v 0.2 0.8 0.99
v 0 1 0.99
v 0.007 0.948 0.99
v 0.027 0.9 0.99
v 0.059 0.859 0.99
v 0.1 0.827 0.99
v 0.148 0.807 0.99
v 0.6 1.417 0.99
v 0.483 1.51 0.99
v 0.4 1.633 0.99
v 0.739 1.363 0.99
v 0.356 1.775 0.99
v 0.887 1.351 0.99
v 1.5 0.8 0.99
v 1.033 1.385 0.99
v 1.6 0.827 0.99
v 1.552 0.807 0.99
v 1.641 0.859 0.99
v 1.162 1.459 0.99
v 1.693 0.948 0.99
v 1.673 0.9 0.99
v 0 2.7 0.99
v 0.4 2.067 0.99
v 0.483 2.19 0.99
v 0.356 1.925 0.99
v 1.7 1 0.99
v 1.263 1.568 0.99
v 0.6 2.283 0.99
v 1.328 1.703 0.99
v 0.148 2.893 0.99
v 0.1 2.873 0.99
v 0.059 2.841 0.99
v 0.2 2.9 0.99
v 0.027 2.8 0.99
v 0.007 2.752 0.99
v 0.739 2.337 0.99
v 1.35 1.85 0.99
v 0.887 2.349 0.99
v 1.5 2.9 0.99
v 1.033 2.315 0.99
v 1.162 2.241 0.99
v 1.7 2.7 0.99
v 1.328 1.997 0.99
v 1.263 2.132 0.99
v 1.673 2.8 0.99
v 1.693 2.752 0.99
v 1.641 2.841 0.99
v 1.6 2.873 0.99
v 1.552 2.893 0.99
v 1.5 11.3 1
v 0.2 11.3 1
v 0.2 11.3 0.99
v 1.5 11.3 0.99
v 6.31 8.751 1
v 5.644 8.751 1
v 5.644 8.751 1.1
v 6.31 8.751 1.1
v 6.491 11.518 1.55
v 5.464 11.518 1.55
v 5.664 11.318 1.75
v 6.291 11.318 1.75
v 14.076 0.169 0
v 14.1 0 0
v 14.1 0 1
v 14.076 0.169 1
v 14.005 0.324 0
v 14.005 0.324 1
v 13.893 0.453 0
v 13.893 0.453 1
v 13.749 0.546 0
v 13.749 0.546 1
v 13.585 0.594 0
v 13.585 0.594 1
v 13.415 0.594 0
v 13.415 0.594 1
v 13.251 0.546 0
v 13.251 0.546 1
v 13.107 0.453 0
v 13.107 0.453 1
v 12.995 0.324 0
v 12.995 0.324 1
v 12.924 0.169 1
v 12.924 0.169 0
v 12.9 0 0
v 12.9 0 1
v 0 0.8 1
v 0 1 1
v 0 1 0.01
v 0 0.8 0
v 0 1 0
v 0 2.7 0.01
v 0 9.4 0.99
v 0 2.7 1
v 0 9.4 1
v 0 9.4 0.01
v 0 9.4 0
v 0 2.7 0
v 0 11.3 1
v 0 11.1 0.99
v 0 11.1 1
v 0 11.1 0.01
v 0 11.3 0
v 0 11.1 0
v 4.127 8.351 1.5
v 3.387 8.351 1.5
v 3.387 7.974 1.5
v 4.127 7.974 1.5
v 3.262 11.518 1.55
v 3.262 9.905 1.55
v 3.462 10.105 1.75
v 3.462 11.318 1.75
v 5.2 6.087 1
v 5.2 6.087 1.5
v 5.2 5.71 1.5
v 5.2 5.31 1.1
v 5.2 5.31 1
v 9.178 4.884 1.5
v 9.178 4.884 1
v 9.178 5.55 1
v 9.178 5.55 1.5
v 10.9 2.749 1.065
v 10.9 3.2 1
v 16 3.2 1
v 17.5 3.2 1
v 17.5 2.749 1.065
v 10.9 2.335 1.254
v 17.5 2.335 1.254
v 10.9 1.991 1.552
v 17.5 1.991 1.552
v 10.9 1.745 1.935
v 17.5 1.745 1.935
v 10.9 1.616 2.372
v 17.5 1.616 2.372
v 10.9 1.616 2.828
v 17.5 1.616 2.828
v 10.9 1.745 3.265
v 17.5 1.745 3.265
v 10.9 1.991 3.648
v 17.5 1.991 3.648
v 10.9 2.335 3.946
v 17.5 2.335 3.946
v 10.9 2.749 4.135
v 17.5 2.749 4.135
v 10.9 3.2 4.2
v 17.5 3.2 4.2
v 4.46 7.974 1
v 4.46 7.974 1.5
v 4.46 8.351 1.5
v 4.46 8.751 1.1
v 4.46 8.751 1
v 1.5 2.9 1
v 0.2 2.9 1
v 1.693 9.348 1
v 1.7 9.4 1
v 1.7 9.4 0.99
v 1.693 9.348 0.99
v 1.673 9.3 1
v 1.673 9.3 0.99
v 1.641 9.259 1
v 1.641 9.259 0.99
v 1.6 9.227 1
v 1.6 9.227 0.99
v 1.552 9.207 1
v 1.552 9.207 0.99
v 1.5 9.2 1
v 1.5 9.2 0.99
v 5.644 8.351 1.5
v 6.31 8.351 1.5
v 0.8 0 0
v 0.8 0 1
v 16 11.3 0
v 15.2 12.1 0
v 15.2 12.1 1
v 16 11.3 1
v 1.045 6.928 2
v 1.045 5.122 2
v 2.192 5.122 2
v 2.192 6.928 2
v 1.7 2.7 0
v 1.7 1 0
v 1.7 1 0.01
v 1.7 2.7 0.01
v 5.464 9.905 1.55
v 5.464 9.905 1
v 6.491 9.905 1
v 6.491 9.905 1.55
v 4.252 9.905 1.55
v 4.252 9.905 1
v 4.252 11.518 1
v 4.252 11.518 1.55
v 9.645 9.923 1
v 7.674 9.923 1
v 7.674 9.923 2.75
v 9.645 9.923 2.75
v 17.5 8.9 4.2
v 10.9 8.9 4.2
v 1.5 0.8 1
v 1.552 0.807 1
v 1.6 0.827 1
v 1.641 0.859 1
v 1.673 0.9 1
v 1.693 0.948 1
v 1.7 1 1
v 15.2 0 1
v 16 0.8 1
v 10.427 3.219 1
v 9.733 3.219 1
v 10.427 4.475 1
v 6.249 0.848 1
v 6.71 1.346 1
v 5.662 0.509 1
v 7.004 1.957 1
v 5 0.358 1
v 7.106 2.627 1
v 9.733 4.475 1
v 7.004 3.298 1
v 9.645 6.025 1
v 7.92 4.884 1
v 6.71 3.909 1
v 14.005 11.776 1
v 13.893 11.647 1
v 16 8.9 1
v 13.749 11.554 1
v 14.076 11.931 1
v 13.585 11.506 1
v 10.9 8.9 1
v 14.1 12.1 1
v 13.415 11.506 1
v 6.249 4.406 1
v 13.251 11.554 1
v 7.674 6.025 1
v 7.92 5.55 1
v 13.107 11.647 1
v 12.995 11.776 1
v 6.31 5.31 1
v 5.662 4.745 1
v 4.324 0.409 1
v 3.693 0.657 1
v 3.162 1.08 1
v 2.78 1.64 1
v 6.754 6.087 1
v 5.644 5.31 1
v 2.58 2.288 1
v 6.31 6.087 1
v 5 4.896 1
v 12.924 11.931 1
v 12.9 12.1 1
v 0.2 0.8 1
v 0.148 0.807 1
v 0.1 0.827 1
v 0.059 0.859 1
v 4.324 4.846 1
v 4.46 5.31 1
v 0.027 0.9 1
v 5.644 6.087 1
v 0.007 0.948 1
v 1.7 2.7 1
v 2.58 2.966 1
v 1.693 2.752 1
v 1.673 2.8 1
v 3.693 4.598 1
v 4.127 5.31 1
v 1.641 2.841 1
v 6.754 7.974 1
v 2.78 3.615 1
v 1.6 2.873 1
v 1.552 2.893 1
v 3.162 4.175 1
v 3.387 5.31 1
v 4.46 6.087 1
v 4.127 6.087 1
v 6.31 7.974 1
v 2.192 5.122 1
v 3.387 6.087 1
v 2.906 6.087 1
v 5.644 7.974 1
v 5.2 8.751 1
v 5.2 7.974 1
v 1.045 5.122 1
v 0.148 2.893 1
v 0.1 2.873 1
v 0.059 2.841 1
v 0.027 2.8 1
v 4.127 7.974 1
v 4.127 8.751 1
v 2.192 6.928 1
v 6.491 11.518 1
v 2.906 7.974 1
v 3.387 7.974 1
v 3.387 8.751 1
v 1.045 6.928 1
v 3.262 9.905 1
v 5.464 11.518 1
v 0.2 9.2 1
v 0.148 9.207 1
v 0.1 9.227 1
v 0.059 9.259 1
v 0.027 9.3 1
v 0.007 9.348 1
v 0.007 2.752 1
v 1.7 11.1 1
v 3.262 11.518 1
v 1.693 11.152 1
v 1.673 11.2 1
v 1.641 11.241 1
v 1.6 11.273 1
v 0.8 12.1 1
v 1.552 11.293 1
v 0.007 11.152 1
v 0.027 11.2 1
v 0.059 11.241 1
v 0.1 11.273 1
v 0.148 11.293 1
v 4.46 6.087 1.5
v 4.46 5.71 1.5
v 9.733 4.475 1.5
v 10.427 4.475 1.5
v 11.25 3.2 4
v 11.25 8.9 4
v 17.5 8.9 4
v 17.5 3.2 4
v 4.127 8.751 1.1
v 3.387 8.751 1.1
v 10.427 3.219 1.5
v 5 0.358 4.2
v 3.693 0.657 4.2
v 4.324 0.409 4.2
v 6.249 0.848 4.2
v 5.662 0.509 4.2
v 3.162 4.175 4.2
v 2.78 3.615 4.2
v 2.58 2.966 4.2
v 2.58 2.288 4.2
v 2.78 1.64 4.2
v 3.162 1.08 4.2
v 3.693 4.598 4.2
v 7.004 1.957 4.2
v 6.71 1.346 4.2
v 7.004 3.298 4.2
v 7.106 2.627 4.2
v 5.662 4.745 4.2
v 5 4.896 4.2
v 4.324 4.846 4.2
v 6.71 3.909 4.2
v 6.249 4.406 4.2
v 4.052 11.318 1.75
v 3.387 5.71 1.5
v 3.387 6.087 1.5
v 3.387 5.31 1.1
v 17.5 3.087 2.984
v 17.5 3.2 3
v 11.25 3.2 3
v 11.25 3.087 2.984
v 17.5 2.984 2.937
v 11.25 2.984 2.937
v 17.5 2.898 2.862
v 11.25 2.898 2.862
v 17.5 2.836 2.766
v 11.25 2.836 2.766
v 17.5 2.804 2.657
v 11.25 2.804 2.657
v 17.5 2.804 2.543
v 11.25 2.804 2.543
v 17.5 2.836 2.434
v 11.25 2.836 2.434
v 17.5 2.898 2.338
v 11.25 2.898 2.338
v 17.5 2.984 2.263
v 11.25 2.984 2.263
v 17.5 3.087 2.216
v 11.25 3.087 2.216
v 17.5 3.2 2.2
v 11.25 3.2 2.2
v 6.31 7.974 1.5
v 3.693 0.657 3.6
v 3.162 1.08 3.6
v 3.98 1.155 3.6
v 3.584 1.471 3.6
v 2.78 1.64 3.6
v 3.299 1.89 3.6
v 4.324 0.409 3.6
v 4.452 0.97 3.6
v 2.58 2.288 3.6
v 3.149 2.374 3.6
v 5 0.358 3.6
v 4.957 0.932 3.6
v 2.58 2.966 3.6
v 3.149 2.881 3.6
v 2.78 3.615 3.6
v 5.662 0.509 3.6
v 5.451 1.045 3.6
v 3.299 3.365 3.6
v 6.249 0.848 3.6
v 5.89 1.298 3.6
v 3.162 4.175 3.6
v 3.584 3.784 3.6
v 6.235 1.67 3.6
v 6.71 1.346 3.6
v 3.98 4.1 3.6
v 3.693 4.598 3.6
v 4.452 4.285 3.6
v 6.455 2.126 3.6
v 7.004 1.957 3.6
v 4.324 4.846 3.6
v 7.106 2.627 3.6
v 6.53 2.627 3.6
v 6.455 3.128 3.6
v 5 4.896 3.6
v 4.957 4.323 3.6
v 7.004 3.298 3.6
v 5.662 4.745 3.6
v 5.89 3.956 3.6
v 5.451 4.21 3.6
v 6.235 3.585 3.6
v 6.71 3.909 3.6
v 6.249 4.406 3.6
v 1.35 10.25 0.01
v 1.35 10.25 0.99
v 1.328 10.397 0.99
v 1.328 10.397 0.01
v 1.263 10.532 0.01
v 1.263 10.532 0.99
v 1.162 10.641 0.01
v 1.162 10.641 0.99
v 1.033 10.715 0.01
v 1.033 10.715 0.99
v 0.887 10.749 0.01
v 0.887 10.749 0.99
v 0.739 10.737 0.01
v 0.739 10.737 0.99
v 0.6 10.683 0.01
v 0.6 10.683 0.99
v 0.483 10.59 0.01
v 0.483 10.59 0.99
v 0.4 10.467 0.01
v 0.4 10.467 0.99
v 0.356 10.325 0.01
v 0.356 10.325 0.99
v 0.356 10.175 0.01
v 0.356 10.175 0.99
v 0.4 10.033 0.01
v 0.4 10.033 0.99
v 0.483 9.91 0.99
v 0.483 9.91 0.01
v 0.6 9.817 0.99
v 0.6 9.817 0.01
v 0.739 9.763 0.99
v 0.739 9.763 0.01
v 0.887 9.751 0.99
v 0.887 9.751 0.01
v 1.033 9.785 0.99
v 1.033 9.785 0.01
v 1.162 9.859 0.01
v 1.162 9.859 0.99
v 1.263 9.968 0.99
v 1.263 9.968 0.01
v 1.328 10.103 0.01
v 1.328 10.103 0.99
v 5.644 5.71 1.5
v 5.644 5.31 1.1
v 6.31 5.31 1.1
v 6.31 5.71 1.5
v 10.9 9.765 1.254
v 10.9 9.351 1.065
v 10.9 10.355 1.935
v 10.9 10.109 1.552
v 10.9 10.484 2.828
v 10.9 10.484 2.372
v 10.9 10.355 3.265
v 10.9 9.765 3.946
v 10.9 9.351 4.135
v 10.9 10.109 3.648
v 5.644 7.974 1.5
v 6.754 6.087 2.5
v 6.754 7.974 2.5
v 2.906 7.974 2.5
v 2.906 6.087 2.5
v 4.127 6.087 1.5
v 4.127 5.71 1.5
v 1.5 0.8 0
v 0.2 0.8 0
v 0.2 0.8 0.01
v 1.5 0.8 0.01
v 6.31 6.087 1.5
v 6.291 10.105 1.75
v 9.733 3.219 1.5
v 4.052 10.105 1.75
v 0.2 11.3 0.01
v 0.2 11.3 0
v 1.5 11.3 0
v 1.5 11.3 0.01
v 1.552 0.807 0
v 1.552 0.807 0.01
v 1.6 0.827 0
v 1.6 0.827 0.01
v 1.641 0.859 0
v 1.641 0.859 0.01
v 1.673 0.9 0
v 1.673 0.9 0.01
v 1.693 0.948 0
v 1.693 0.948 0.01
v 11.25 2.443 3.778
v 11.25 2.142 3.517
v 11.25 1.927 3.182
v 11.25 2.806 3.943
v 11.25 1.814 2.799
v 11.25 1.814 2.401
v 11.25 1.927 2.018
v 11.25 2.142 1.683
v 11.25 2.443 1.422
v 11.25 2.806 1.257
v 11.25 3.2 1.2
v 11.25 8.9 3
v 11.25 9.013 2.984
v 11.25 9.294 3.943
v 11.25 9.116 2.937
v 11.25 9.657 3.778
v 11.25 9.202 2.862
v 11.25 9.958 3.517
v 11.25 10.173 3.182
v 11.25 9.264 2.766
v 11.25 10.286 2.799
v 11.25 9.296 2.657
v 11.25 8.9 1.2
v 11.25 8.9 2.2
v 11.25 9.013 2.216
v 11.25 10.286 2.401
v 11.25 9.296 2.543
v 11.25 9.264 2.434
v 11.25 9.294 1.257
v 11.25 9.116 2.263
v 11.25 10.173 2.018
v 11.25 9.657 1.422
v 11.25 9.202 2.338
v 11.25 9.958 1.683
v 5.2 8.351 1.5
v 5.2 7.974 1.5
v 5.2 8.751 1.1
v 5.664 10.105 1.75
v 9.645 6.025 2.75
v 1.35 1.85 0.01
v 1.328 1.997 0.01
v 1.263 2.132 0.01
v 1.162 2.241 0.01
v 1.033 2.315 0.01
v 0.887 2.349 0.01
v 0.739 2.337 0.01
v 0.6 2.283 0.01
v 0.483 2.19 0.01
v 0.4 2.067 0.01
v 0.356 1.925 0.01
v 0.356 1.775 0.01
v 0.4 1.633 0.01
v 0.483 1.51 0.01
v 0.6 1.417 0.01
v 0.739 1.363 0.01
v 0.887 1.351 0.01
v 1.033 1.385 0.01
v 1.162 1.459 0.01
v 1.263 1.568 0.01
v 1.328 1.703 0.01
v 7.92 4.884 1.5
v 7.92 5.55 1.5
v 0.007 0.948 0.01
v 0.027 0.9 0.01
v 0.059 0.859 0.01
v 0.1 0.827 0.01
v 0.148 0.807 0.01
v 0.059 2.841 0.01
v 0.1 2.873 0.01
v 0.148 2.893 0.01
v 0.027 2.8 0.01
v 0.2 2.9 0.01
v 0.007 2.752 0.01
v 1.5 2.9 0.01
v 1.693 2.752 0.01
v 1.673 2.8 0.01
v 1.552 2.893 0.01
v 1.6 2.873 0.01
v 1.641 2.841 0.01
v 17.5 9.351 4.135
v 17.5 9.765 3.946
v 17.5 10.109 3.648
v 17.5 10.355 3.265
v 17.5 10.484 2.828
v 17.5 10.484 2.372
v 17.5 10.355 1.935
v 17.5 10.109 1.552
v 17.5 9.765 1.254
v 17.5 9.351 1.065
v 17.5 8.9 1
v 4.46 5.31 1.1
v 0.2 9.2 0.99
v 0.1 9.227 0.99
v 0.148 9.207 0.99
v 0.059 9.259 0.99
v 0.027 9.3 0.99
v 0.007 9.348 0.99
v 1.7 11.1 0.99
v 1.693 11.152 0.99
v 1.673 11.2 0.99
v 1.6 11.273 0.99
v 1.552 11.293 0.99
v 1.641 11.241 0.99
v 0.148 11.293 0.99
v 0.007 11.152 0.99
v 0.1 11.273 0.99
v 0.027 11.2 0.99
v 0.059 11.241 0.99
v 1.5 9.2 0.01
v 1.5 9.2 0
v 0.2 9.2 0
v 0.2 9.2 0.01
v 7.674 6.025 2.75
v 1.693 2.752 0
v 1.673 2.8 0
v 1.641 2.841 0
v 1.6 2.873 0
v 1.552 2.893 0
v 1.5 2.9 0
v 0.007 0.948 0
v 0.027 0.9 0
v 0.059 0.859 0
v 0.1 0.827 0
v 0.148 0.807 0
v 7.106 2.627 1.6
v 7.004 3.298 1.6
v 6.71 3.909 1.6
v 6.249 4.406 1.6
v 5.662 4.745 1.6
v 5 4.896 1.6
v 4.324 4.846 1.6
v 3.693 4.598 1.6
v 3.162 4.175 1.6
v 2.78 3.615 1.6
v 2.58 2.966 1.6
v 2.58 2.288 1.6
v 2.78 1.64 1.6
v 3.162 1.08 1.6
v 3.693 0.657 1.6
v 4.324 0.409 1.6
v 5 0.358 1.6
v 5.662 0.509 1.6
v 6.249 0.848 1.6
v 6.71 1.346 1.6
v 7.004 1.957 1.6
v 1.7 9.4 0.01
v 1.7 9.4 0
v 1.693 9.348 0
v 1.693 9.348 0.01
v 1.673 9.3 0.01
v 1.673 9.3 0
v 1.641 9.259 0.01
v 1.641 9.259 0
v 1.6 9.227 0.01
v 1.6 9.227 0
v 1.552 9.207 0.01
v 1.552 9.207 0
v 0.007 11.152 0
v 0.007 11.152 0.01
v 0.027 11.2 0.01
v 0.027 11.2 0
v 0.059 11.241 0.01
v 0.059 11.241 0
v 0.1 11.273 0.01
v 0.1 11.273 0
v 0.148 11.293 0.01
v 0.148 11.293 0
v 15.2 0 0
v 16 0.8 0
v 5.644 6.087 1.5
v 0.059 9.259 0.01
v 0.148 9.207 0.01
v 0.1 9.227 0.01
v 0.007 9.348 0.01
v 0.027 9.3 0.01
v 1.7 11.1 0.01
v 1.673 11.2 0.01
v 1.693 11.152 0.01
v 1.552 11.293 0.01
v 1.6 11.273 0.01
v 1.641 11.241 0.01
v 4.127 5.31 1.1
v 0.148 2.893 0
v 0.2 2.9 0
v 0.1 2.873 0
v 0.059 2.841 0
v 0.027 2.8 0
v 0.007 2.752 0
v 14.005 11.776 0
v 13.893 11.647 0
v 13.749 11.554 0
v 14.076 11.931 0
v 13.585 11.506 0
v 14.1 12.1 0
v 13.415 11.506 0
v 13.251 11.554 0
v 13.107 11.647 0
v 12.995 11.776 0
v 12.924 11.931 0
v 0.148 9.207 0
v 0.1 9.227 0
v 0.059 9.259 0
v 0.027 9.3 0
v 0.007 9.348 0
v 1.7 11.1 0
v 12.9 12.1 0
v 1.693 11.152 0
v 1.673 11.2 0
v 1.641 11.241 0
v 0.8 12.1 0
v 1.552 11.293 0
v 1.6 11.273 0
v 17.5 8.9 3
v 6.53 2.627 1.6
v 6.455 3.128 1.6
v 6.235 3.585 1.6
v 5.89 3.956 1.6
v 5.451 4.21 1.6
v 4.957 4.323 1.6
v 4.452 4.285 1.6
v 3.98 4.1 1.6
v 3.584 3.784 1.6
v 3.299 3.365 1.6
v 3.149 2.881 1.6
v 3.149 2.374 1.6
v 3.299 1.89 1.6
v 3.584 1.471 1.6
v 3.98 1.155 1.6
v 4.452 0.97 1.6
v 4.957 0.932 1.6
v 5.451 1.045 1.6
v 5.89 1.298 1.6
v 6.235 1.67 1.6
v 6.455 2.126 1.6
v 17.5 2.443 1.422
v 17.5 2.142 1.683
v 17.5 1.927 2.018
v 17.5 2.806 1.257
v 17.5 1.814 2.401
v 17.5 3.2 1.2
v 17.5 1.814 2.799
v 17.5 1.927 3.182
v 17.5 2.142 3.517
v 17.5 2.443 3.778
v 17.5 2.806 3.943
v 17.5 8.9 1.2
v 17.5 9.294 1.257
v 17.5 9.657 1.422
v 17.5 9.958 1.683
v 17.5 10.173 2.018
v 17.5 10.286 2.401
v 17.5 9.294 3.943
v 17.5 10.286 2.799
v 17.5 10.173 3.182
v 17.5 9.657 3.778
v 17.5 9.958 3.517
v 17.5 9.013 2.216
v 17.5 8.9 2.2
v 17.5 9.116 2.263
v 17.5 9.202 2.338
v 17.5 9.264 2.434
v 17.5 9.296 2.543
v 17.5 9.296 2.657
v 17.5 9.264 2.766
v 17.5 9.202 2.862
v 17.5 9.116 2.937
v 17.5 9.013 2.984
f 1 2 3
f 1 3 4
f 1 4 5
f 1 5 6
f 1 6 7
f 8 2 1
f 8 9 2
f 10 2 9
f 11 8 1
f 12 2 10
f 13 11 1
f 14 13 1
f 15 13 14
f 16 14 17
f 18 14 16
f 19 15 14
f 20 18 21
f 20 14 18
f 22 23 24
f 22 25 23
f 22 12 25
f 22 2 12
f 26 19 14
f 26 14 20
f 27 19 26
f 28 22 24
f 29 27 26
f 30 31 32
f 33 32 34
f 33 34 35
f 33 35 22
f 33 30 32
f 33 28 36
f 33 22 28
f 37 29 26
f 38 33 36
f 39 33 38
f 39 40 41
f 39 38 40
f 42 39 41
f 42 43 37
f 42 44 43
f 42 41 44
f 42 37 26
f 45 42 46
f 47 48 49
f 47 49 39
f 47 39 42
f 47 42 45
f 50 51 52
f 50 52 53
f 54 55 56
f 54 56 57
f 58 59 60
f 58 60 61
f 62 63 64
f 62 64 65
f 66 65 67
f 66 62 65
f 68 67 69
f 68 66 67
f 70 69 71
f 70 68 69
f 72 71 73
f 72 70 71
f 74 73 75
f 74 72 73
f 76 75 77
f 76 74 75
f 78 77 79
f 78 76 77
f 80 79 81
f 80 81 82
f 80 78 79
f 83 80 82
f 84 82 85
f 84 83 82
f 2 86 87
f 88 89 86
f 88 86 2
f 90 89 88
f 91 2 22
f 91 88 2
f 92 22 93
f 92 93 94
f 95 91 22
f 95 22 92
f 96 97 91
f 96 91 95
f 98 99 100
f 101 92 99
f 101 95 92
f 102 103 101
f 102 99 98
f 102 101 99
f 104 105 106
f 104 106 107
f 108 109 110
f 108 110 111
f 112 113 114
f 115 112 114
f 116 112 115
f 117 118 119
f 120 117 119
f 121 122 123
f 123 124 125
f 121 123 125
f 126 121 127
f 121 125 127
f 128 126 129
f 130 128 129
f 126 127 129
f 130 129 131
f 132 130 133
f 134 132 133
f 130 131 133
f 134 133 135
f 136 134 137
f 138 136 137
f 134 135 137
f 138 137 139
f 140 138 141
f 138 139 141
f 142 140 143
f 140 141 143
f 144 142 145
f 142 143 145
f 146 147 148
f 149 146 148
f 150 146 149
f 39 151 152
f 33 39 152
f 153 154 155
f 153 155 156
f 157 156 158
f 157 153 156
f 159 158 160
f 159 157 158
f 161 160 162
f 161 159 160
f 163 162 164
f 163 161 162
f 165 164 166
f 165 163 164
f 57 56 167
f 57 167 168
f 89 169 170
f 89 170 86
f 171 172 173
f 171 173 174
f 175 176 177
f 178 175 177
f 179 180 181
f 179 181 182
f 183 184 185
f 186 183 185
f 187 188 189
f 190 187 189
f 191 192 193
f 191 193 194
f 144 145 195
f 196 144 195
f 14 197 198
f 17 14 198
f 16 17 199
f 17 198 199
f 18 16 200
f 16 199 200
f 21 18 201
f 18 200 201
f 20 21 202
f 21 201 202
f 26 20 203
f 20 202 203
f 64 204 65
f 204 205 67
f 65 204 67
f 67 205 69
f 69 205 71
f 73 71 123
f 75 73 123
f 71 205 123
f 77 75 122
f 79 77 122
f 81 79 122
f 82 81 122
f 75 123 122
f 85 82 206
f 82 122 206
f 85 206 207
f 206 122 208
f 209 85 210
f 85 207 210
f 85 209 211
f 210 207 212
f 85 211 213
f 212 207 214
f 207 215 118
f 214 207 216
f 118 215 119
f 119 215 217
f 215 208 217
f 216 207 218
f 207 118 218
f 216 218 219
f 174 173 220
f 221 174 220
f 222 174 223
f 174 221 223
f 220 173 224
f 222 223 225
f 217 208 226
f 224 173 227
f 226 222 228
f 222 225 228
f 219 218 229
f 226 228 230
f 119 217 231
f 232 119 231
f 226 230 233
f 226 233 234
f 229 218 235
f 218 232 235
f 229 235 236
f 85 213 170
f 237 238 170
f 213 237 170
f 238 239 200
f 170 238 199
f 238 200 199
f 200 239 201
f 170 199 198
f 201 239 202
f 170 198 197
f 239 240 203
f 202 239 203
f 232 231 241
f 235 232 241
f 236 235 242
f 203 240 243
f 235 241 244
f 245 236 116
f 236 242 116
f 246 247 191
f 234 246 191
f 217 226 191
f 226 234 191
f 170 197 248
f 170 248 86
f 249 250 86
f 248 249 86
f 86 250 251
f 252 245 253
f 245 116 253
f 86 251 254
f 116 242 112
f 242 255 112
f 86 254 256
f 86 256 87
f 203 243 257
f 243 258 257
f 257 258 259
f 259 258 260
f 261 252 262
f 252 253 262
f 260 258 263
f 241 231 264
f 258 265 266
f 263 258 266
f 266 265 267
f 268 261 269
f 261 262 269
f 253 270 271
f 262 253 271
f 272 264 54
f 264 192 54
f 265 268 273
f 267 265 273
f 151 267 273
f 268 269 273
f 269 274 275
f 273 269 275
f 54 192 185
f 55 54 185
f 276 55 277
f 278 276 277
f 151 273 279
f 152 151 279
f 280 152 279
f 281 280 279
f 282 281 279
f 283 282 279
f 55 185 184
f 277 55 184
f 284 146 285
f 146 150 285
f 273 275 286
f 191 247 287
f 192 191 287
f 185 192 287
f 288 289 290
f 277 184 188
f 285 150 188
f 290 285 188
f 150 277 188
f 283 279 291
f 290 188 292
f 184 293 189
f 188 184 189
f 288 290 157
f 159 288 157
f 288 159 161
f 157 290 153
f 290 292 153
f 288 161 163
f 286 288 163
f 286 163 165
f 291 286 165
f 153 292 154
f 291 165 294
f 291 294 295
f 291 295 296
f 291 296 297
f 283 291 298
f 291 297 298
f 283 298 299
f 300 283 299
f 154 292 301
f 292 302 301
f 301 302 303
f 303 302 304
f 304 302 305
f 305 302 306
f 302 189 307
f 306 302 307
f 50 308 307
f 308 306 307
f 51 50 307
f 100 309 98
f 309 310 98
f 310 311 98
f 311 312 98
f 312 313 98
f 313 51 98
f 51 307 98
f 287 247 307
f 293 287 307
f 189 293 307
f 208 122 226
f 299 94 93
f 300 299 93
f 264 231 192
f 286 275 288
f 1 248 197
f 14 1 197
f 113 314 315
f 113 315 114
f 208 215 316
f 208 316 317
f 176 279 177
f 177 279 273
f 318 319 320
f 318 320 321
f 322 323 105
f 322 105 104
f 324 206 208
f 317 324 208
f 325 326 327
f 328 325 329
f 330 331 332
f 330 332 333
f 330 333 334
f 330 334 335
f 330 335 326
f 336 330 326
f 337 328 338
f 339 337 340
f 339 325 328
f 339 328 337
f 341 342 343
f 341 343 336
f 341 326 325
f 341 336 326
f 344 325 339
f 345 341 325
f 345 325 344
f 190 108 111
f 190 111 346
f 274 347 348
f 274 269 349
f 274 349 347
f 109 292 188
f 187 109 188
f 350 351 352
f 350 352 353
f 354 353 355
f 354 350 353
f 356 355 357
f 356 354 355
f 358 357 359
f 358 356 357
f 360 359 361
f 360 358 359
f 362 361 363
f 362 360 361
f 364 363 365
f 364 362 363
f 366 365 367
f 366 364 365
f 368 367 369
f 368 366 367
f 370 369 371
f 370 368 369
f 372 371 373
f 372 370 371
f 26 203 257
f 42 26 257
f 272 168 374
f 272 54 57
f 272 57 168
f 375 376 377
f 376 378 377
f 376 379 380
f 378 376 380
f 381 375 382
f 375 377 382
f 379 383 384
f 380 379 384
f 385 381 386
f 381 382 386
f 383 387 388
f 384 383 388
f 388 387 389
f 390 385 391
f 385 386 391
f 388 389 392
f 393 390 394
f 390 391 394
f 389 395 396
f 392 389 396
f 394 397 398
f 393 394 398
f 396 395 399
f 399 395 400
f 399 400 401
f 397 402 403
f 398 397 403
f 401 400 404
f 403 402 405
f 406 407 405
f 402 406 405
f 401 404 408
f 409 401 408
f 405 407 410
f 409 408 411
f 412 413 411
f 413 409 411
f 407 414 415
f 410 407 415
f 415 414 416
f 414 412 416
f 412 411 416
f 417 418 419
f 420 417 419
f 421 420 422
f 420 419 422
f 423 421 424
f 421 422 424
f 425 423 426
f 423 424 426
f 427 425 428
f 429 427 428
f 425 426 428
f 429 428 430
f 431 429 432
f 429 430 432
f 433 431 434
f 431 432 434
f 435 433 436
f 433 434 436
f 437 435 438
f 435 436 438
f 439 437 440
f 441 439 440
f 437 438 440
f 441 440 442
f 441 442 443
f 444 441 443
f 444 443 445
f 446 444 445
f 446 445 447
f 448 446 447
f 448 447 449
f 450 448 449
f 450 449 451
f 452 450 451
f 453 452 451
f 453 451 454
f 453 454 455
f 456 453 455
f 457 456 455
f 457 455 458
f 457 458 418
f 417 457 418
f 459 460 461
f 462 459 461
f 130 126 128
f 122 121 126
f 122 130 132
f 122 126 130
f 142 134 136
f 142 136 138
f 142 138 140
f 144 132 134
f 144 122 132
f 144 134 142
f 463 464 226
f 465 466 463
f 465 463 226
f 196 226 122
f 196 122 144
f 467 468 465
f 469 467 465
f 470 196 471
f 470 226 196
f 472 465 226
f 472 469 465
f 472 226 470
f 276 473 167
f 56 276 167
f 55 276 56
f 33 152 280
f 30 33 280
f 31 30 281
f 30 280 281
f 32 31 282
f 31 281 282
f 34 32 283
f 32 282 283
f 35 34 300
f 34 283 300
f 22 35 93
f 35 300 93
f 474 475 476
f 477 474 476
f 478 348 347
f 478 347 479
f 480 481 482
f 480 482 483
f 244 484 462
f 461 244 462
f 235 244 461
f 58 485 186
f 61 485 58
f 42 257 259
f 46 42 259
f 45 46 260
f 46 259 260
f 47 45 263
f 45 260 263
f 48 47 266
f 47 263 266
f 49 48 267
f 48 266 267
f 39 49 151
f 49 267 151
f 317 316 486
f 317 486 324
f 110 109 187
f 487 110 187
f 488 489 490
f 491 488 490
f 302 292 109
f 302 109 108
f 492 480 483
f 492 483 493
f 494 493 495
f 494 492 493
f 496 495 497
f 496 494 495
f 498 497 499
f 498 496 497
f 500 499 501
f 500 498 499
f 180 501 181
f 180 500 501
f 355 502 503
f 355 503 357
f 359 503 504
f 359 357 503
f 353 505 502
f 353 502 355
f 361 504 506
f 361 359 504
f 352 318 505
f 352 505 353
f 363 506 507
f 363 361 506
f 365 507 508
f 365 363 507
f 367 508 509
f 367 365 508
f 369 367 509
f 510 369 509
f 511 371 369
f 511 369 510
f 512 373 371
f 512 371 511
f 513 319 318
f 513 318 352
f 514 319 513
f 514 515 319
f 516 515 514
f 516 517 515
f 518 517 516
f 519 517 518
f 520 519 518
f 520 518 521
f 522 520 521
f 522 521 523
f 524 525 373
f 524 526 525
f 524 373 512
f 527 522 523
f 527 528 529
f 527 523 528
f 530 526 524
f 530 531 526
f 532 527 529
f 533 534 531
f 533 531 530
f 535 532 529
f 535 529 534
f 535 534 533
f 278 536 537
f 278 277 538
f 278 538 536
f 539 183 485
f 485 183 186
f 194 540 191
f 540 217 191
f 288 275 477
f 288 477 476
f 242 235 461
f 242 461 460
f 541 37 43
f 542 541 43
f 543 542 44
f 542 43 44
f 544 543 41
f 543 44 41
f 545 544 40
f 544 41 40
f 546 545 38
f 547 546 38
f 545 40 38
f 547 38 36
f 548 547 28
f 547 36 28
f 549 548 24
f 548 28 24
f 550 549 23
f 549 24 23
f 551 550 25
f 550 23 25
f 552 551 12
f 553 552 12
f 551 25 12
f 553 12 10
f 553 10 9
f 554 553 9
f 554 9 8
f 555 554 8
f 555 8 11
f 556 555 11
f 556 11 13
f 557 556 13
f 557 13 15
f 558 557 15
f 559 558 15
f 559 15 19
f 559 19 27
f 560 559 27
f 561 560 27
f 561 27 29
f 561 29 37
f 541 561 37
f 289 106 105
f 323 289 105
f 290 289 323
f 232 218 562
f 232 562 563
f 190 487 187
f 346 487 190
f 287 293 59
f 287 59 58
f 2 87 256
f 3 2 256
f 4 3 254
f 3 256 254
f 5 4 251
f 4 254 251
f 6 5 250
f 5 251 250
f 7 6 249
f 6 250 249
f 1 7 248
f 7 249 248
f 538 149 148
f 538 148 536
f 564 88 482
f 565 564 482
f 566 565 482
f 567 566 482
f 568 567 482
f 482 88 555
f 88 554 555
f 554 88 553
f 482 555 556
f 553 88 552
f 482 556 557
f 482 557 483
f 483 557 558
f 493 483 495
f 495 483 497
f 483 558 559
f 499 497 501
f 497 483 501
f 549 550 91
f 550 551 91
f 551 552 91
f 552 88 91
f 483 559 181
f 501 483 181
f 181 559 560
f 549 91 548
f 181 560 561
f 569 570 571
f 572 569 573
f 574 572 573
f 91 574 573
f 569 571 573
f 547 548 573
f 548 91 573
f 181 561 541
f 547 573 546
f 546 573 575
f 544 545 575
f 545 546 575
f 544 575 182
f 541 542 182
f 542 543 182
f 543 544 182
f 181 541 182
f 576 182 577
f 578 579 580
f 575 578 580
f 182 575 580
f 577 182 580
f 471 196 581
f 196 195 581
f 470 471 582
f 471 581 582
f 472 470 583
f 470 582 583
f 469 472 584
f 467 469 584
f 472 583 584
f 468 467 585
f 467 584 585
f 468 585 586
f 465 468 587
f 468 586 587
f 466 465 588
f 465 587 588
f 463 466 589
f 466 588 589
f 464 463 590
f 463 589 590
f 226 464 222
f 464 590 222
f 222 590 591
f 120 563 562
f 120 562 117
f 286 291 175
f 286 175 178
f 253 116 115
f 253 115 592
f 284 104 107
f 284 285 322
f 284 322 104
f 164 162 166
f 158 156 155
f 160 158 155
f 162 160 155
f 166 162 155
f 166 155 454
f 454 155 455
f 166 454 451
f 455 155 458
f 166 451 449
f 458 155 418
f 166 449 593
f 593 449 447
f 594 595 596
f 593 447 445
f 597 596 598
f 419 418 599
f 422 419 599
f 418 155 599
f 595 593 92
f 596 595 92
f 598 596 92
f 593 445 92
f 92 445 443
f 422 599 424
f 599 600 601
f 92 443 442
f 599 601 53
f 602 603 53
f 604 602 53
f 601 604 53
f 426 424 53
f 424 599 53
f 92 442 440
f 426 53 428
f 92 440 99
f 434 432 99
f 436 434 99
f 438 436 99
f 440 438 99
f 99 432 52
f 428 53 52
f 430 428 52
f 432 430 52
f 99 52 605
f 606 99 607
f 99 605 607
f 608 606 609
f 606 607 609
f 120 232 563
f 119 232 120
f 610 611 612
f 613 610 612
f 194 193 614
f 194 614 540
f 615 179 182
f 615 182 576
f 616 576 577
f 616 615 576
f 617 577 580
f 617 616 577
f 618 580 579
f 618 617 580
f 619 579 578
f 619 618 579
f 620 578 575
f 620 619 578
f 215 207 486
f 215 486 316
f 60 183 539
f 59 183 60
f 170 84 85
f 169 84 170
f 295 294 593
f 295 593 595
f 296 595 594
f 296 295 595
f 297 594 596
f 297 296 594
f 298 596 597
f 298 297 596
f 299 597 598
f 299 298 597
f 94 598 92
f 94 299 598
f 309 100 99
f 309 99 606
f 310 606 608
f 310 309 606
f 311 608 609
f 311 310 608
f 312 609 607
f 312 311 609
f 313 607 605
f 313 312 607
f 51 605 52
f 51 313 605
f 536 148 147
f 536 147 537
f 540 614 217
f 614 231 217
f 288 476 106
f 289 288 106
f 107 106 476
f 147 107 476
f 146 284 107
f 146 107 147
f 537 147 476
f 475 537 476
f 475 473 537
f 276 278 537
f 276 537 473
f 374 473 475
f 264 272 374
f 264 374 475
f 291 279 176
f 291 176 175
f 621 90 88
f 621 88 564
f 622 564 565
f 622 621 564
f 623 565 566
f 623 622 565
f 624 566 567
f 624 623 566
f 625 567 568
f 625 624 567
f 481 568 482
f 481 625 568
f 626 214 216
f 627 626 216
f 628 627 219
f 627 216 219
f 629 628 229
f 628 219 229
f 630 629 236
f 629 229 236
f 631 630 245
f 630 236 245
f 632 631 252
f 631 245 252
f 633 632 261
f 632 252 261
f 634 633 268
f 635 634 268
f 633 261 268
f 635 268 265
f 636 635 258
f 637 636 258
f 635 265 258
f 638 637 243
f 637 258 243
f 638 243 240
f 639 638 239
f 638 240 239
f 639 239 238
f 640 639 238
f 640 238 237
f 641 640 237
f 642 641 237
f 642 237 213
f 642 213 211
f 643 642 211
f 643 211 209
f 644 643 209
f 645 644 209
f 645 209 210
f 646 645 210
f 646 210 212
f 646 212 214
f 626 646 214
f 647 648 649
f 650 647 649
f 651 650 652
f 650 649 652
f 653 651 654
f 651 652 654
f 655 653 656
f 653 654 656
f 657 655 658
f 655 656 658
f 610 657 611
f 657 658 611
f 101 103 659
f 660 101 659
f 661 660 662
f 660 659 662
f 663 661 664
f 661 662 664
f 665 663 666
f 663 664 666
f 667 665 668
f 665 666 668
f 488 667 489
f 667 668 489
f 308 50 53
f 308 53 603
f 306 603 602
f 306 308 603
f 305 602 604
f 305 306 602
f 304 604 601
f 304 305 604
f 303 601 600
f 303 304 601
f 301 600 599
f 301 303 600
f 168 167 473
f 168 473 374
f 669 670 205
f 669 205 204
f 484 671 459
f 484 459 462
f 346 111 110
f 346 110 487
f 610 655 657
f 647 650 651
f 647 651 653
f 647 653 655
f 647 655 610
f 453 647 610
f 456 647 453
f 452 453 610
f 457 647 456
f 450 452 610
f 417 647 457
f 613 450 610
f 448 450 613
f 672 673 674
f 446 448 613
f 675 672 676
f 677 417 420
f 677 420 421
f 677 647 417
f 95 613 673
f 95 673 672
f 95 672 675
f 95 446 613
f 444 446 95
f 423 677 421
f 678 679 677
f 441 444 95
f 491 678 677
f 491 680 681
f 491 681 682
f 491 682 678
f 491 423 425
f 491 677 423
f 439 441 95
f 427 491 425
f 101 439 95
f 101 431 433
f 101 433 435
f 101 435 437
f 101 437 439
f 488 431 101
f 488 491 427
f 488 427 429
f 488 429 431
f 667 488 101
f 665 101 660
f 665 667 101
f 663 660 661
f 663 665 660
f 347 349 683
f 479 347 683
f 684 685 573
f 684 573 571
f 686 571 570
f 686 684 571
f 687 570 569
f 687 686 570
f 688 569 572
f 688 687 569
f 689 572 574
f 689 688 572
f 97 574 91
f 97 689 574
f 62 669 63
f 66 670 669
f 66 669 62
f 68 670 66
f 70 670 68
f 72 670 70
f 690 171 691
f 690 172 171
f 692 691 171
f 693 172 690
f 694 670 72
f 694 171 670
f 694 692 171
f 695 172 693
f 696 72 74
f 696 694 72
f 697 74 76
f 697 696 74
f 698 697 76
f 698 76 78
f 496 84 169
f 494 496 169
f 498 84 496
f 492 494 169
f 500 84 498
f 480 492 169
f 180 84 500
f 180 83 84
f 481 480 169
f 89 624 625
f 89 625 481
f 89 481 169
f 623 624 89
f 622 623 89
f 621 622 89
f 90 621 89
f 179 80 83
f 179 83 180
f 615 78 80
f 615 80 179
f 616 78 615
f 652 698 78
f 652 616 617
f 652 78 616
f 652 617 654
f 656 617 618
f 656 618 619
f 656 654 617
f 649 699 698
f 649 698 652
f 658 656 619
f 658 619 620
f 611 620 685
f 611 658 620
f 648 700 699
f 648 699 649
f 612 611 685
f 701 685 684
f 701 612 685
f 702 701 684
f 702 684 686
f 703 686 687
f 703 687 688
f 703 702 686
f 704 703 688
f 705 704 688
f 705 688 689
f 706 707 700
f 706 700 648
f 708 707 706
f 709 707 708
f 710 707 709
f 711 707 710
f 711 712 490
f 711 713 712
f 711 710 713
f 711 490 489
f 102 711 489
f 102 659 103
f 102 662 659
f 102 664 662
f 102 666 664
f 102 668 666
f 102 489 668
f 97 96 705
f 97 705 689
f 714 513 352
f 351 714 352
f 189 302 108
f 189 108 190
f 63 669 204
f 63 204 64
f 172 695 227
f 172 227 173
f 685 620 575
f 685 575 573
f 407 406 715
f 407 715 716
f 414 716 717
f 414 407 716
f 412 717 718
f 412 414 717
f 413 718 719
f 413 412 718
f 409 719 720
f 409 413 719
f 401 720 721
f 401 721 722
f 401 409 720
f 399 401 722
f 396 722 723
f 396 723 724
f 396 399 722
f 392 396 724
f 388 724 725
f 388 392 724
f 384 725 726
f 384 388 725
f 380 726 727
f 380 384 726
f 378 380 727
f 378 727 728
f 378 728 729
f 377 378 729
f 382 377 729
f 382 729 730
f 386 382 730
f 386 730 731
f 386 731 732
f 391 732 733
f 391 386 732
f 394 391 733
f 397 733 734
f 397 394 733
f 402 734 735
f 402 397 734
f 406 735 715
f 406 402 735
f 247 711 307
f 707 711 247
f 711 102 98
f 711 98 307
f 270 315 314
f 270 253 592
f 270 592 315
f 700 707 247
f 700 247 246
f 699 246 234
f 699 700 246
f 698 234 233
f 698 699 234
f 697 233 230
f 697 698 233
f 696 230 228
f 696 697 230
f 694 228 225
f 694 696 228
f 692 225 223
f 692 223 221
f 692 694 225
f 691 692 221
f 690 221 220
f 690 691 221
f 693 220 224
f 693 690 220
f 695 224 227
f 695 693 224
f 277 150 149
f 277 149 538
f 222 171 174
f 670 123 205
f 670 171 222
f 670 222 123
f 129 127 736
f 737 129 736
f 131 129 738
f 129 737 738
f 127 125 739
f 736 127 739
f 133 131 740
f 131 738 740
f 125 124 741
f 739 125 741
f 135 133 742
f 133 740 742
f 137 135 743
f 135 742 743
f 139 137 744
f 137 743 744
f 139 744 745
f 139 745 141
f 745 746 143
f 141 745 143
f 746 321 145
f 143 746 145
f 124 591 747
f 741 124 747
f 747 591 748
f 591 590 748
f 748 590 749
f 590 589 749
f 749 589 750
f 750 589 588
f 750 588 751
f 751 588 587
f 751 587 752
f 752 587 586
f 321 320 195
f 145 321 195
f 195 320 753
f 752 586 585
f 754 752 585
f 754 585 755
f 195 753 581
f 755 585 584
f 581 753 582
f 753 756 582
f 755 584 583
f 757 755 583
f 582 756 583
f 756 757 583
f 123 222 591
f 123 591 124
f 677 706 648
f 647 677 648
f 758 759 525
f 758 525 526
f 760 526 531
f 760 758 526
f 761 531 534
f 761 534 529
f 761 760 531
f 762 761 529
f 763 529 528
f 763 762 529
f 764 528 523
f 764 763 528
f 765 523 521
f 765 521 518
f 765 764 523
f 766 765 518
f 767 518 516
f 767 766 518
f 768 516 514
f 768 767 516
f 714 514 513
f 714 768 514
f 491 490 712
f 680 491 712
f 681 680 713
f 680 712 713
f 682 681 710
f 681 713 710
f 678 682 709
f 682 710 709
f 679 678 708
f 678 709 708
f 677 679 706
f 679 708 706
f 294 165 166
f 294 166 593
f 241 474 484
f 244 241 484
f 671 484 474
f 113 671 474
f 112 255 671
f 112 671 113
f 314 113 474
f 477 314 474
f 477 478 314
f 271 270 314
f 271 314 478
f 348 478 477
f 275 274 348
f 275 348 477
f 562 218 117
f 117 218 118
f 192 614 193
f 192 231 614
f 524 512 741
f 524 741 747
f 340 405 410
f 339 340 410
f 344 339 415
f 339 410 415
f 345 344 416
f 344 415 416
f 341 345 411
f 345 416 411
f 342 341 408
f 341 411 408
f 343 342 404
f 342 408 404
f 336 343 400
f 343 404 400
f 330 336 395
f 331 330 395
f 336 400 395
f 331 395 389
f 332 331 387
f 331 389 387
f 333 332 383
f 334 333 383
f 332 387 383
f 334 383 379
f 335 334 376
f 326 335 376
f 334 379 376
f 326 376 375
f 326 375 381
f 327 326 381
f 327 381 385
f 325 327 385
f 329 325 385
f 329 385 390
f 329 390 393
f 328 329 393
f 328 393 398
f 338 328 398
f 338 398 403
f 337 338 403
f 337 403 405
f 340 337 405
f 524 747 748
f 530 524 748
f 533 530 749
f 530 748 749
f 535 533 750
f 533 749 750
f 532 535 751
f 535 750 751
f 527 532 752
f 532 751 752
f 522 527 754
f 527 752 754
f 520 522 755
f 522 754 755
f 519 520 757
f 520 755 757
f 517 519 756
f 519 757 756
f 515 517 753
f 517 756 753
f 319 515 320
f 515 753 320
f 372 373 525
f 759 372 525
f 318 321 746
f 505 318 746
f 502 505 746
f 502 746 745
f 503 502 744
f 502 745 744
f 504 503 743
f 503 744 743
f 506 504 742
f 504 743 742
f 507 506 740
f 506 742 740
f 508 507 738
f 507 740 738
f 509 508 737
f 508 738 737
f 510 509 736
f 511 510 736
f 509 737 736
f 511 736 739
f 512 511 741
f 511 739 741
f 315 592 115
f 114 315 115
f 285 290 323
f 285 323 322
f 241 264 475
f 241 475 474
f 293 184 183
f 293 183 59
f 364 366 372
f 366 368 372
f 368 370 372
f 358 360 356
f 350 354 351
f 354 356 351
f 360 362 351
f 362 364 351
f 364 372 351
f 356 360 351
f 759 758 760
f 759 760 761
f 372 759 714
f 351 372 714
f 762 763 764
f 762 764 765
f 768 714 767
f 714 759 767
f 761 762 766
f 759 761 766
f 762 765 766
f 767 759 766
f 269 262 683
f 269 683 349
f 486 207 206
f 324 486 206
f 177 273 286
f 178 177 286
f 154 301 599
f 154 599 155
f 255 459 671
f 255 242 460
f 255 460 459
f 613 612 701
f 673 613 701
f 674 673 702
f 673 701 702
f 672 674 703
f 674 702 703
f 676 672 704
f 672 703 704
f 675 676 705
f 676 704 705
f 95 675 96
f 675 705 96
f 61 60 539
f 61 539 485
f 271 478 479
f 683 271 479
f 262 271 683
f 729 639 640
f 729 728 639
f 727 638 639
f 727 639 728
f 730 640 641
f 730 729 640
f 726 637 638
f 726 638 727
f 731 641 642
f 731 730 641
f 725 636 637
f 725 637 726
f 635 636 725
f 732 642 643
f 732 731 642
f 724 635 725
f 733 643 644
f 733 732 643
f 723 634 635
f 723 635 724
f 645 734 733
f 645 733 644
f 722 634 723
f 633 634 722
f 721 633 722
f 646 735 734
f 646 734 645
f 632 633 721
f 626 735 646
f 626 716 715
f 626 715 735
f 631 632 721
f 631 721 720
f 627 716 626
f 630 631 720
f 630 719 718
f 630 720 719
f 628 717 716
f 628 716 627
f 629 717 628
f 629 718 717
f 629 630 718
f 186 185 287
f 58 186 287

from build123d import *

# Parameters (mm, degrees)
BOSS_EXTRU_1_DEPTH      = 1
ESQUISSE2_R             = 0.5
ENL_V_MAT_EXTRU_1_DEPTH = 10
ENL_V_MAT_EXTRU_2_DEPTH = 0.01
ENL_V_START             = -1
ENL_V_MAT_EXTRU_3_DEPTH = 0.01
BOSS_EXTRU_2_DEPTH      = 1.5
BOSS_EXTRU_2_DEPTH_BACK = 5.1
ESQUISSE5_R             = 2.275332805
BOSS_EXTRU_3_DEPTH      = 3.2
ENL_V_START_2           = -0.6
ESQUISSE6_R             = 2.275332805
ESQUISSE6_R_2           = 1.7
ENL_V_MAT_EXTRU_4_DEPTH = 2
ESQUISSE7_W             = 1.97090018
ESQUISSE7_H             = 3.898474417
ESQUISSE7_W_2           = 0.989857895
ESQUISSE7_H_2           = 1.612554693
ESQUISSE7_W_3           = 1.027355852
ESQUISSE7_W_4           = 1.146705559
ESQUISSE7_H_3           = 1.806710228
BOSS_EXTRU_4_DEPTH      = 1.5
ESQUISSE8_W             = 1.25807389
ESQUISSE8_H             = 0.666039119
ESQUISSE8_W_2           = 0.69364074
ESQUISSE8_H_2           = 1.255273727
BOSS_EXTRU_5_DEPTH      = 0.5
ESQUISSE9_W             = 3.84822602
ESQUISSE9_H             = 0.777045638
ENL_V_MAT_EXTRU_5_DEPTH = 1
CHANFREIN1_SIZE         = 0.4
ESQUISSE10_W            = 3.228737269
ESQUISSE10_H            = 1.612554693
ENL_V_MAT_EXTRU_6_DEPTH = 0.75
ESQUISSE11_W            = 1.213675147
ESQUISSE11_H            = 1.927537991
ENL_V_MAT_EXTRU_7_DEPTH = 0.5
ESQUISSE12_W            = 1.97090018
ESQUISSE12_H            = 3.898474417
BOSS_EXTRU_6_DEPTH      = 0.25
CHANFREIN2_SIZE         = 0.2
ENL_V_MAT_EXTRU_8_DEPTH = 6.25


with BuildPart() as part:
    # Esquisse1 → Boss.-Extru.1 (new body)
    with BuildSketch(Plane.XY):
        with BuildLine():
            Line((0, 11.3), (0.8, 12.1))
            Line((0.8, 12.1), (12.9, 12.1))
            ThreePointArc((12.9, 12.1), (13.5, 11.5), (14.1, 12.1))
            Line((14.1, 12.1), (15.2, 12.1))
            Line((15.2, 12.1), (16, 11.3))
            Line((16, 11.3), (16, 0.8))
            Line((16, 0.8), (15.2, 0))
            Line((15.2, 0), (14.1, 0))
            ThreePointArc((14.1, 0), (13.5, 0.6), (12.9, 0))
            Line((12.9, 0), (0.8, 0))
            Line((0.8, 0), (0, 0.8))
            Line((0, 0.8), (0, 11.3))
        make_face()
    extrude(amount=BOSS_EXTRU_1_DEPTH)

    # Esquisse2 → Enl_v. mat.-Extru.1 (cut)
    with BuildSketch(Plane.XY.offset(1)):
        with Locations((0.85, 10.25)):
            Circle(ESQUISSE2_R)
        with Locations((0.85, 1.85)):
            Circle(ESQUISSE2_R)
    extrude(amount=-ENL_V_MAT_EXTRU_1_DEPTH, mode=Mode.SUBTRACT)

    # Esquisse3 → Enl_v. mat.-Extru.2 (cut)
    with BuildSketch(Plane.XY.offset(1)):
        with BuildLine():
            Line((1.5, 9.2), (0.2, 9.2))
            ThreePointArc((0.2, 9.2), (0.058578644, 9.258578644), (0, 9.4))
            Line((0, 9.4), (0, 11.1))
            ThreePointArc((0, 11.1), (0.058578644, 11.241421356), (0.2, 11.3))
            Line((0.2, 11.3), (1.5, 11.3))
            ThreePointArc((1.5, 11.3), (1.641421356, 11.241421356), (1.7, 11.1))
            Line((1.7, 11.1), (1.7, 9.4))
            ThreePointArc((1.7, 9.4), (1.641421356, 9.258578644), (1.5, 9.2))
        make_face()
        with BuildLine():
            Line((1.5, 2.9), (0.2, 2.9))
            ThreePointArc((0.2, 2.9), (0.058578644, 2.841421356), (0, 2.7))
            Line((0, 2.7), (0, 1))
            ThreePointArc((0, 1), (0.058578644, 0.858578644), (0.2, 0.8))
            Line((0.2, 0.8), (1.5, 0.8))
            ThreePointArc((1.5, 0.8), (1.641421356, 0.858578644), (1.7, 1))
            Line((1.7, 1), (1.7, 2.7))
            ThreePointArc((1.7, 2.7), (1.641421356, 2.841421356), (1.5, 2.9))
        make_face()
    extrude(amount=-ENL_V_MAT_EXTRU_2_DEPTH, mode=Mode.SUBTRACT)

    # Esquisse3_2 → Enl_v. mat.-Extru.3 (cut)
    with BuildSketch(Plane.XY.offset(1).offset(ENL_V_START)):
        with BuildLine():
            Line((1.5, 9.2), (0.2, 9.2))
            ThreePointArc((0.2, 9.2), (0.058578644, 9.258578644), (0, 9.4))
            Line((0, 9.4), (0, 11.1))
            ThreePointArc((0, 11.1), (0.058578644, 11.241421356), (0.2, 11.3))
            Line((0.2, 11.3), (1.5, 11.3))
            ThreePointArc((1.5, 11.3), (1.641421356, 11.241421356), (1.7, 11.1))
            Line((1.7, 11.1), (1.7, 9.4))
            ThreePointArc((1.7, 9.4), (1.641421356, 9.258578644), (1.5, 9.2))
        make_face()
        with BuildLine():
            Line((1.5, 2.9), (0.2, 2.9))
            ThreePointArc((0.2, 2.9), (0.058578644, 2.841421356), (0, 2.7))
            Line((0, 2.7), (0, 1))
            ThreePointArc((0, 1), (0.058578644, 0.858578644), (0.2, 0.8))
            Line((0.2, 0.8), (1.5, 0.8))
            ThreePointArc((1.5, 0.8), (1.641421356, 0.858578644), (1.7, 1))
            Line((1.7, 1), (1.7, 2.7))
            ThreePointArc((1.7, 2.7), (1.641421356, 2.841421356), (1.5, 2.9))
        make_face()
    extrude(amount=ENL_V_MAT_EXTRU_3_DEPTH, mode=Mode.SUBTRACT)

    # Esquisse4 → Boss.-Extru.2 (add, two sides)
    with BuildSketch(Plane(origin=(16, 0, 0), x_dir=(0, 0, -1), z_dir=(1, 0, 0))) as boss_extru_2_sk:
        with BuildLine():
            Line((-4.2, 3.2), (-4.2, 8.9))
            ThreePointArc((-4.2, 8.9), (-2.6, 10.5), (-1, 8.9))
            Line((-1, 8.9), (-1, 3.2))
            ThreePointArc((-1, 3.2), (-2.6, 1.6), (-4.2, 3.2))
        make_face()
    extrude(amount=BOSS_EXTRU_2_DEPTH)
    extrude(boss_extru_2_sk.sketch, amount=-BOSS_EXTRU_2_DEPTH_BACK)

    # Esquisse5 → Boss.-Extru.3 (add)
    with BuildSketch(Plane.XY.offset(1)):
        with Locations((4.830231602, 2.627298973)):
            Circle(ESQUISSE5_R)
    extrude(amount=BOSS_EXTRU_3_DEPTH)

    # Esquisse6 → Enl_v. mat.-Extru.4 (cut)
    with BuildSketch(Plane.XY.offset(4.2).offset(ENL_V_START_2)):
        with Locations((4.830231602, 2.627298973)):
            Circle(ESQUISSE6_R)
        with Locations((4.830231602, 2.627298973)):
            Circle(ESQUISSE6_R_2, mode=Mode.SUBTRACT)
    extrude(amount=-ENL_V_MAT_EXTRU_4_DEPTH, mode=Mode.SUBTRACT)

    # Esquisse7 → Boss.-Extru.4 (add)
    with BuildSketch(Plane.XY.offset(1)):
        Polygon((4.12719031, 7.97411301), (4.460209869, 7.97411301), (4.460209869, 8.751158648), (5.200253335, 8.751158648), (5.200253335, 7.97411301), (5.644279414, 7.97411301), (5.644279414, 8.751158648), (6.310318533, 8.751158648), (6.310318533, 7.97411301), (6.754344612, 7.97411301), (6.754344612, 6.087002173), (6.310318533, 6.087002173), (6.310318533, 5.309956535), (5.644279414, 5.309956535), (5.644279414, 6.087002173), (5.200253335, 6.087002173), (5.200253335, 5.309956535), (4.460209869, 5.309956535), (4.460209869, 6.087002173), (4.12719031, 6.087002173), (4.12719031, 5.309956535), (3.387146845, 5.309956535), (3.387146845, 6.087002173), (2.906118592, 6.087002173), (2.906118592, 7.97411301), (3.387146845, 7.97411301), (3.387146845, 8.751158648), (4.12719031, 8.751158648), align=None)
        with Locations((8.659747019, 7.97411301)):
            Rectangle(ESQUISSE7_W, ESQUISSE7_H)
        with Locations((3.757168577, 10.711710291)):
            Rectangle(ESQUISSE7_W_2, ESQUISSE7_H_2)
        with Locations((5.977298973, 10.711710291)):
            Rectangle(ESQUISSE7_W_3, ESQUISSE7_H_2)
        with Locations((1.618258193, 6.024875801)):
            Rectangle(ESQUISSE7_W_4, ESQUISSE7_H_3)
    extrude(amount=BOSS_EXTRU_4_DEPTH)

    # Esquisse8 → Boss.-Extru.5 (add)
    with BuildSketch(Plane.XY.offset(1)):
        with Locations((8.548950015, 5.217451102)):
            Rectangle(ESQUISSE8_W, ESQUISSE8_H)
        with Locations((10.079839929, 3.846970609)):
            Rectangle(ESQUISSE8_W_2, ESQUISSE8_H_2)
    extrude(amount=BOSS_EXTRU_5_DEPTH)

    # Esquisse9 → Enl_v. mat.-Extru.5 (cut)
    with BuildSketch(Plane.XY.offset(2.5)):
        with Locations((4.830231602, 8.362635829)):
            Rectangle(ESQUISSE9_W, ESQUISSE9_H)
        with Locations((4.830231602, 5.698479354)):
            Rectangle(ESQUISSE9_W, ESQUISSE9_H)
    extrude(amount=-ENL_V_MAT_EXTRU_5_DEPTH, mode=Mode.SUBTRACT)

    # Chanfrein1
    chanfrein1_edges = [part.edges().sort_by_distance(p)[0] for p in [
        (3.757168577, 5.309956535, 1.5),
        (4.830231602, 5.309956535, 1.5),
        (5.977298973, 5.309956535, 1.5),
        (5.977298973, 8.751158648, 1.5),
        (4.830231602, 8.751158648, 1.5),
        (3.757168577, 8.751158648, 1.5),
    ]]
    chamfer(chanfrein1_edges, length=CHANFREIN1_SIZE)

    # Esquisse10 → Enl_v. mat.-Extru.6 (cut)
    with BuildSketch(Plane.XY.offset(2.5)):
        with Locations((4.876608265, 10.711710291)):
            Rectangle(ESQUISSE10_W, ESQUISSE10_H)
    extrude(amount=-ENL_V_MAT_EXTRU_6_DEPTH, mode=Mode.SUBTRACT)

    # Esquisse11 → Enl_v. mat.-Extru.7 (cut)
    with BuildSketch(Plane.XY.offset(2.5)):
        with Locations((1.651742986, 6.085289683)):
            Rectangle(ESQUISSE11_W, ESQUISSE11_H)
    extrude(amount=-ENL_V_MAT_EXTRU_7_DEPTH, mode=Mode.SUBTRACT)

    # Esquisse12 → Boss.-Extru.6 (add)
    with BuildSketch(Plane.XY.offset(2.5)):
        with Locations((8.659747019, 7.97411301)):
            Rectangle(ESQUISSE12_W, ESQUISSE12_H)
    extrude(amount=BOSS_EXTRU_6_DEPTH)

    # Chanfrein2
    chanfrein2_edges = [part.edges().sort_by_distance(p)[0] for p in [
        (4.252097525, 10.71171029, 1.75),
        (5.463621047, 10.71171029, 1.75),
        (3.757168577, 9.905432944, 1.75),
        (5.977298973, 9.905432944, 1.75),
        (3.757168577, 11.517987637, 1.75),
        (5.977298973, 11.517987637, 1.75),
        (6.490976899, 10.71171029, 1.75),
        (3.26223963, 10.71171029, 1.75),
    ]]
    chamfer(chanfrein2_edges, length=CHANFREIN2_SIZE)

    # Esquisse13 → Enl_v. mat.-Extru.8 (cut)
    with BuildSketch(Plane(origin=(17.5, 0, 0), x_dir=(0, 0, -1), z_dir=(1, 0, 0))):
        with BuildLine():
            Line((-1.2, 3.2), (-1.2, 8.9))
            ThreePointArc((-1.2, 8.9), (-2.6, 10.3), (-4, 8.9))
            Line((-4, 8.9), (-4, 3.2))
            ThreePointArc((-4, 3.2), (-2.6, 1.8), (-1.2, 3.2))
        make_face()
        with BuildLine():
            Line((-2.2, 3.2), (-2.2, 8.9))
            ThreePointArc((-2.2, 8.9), (-2.6, 9.3), (-3, 8.9))
            Line((-3, 8.9), (-3, 3.2))
            ThreePointArc((-3, 3.2), (-2.6, 2.8), (-2.2, 3.2))
        make_face(mode=Mode.SUBTRACT)
    extrude(amount=-ENL_V_MAT_EXTRU_8_DEPTH, mode=Mode.SUBTRACT)


solid = part.part
